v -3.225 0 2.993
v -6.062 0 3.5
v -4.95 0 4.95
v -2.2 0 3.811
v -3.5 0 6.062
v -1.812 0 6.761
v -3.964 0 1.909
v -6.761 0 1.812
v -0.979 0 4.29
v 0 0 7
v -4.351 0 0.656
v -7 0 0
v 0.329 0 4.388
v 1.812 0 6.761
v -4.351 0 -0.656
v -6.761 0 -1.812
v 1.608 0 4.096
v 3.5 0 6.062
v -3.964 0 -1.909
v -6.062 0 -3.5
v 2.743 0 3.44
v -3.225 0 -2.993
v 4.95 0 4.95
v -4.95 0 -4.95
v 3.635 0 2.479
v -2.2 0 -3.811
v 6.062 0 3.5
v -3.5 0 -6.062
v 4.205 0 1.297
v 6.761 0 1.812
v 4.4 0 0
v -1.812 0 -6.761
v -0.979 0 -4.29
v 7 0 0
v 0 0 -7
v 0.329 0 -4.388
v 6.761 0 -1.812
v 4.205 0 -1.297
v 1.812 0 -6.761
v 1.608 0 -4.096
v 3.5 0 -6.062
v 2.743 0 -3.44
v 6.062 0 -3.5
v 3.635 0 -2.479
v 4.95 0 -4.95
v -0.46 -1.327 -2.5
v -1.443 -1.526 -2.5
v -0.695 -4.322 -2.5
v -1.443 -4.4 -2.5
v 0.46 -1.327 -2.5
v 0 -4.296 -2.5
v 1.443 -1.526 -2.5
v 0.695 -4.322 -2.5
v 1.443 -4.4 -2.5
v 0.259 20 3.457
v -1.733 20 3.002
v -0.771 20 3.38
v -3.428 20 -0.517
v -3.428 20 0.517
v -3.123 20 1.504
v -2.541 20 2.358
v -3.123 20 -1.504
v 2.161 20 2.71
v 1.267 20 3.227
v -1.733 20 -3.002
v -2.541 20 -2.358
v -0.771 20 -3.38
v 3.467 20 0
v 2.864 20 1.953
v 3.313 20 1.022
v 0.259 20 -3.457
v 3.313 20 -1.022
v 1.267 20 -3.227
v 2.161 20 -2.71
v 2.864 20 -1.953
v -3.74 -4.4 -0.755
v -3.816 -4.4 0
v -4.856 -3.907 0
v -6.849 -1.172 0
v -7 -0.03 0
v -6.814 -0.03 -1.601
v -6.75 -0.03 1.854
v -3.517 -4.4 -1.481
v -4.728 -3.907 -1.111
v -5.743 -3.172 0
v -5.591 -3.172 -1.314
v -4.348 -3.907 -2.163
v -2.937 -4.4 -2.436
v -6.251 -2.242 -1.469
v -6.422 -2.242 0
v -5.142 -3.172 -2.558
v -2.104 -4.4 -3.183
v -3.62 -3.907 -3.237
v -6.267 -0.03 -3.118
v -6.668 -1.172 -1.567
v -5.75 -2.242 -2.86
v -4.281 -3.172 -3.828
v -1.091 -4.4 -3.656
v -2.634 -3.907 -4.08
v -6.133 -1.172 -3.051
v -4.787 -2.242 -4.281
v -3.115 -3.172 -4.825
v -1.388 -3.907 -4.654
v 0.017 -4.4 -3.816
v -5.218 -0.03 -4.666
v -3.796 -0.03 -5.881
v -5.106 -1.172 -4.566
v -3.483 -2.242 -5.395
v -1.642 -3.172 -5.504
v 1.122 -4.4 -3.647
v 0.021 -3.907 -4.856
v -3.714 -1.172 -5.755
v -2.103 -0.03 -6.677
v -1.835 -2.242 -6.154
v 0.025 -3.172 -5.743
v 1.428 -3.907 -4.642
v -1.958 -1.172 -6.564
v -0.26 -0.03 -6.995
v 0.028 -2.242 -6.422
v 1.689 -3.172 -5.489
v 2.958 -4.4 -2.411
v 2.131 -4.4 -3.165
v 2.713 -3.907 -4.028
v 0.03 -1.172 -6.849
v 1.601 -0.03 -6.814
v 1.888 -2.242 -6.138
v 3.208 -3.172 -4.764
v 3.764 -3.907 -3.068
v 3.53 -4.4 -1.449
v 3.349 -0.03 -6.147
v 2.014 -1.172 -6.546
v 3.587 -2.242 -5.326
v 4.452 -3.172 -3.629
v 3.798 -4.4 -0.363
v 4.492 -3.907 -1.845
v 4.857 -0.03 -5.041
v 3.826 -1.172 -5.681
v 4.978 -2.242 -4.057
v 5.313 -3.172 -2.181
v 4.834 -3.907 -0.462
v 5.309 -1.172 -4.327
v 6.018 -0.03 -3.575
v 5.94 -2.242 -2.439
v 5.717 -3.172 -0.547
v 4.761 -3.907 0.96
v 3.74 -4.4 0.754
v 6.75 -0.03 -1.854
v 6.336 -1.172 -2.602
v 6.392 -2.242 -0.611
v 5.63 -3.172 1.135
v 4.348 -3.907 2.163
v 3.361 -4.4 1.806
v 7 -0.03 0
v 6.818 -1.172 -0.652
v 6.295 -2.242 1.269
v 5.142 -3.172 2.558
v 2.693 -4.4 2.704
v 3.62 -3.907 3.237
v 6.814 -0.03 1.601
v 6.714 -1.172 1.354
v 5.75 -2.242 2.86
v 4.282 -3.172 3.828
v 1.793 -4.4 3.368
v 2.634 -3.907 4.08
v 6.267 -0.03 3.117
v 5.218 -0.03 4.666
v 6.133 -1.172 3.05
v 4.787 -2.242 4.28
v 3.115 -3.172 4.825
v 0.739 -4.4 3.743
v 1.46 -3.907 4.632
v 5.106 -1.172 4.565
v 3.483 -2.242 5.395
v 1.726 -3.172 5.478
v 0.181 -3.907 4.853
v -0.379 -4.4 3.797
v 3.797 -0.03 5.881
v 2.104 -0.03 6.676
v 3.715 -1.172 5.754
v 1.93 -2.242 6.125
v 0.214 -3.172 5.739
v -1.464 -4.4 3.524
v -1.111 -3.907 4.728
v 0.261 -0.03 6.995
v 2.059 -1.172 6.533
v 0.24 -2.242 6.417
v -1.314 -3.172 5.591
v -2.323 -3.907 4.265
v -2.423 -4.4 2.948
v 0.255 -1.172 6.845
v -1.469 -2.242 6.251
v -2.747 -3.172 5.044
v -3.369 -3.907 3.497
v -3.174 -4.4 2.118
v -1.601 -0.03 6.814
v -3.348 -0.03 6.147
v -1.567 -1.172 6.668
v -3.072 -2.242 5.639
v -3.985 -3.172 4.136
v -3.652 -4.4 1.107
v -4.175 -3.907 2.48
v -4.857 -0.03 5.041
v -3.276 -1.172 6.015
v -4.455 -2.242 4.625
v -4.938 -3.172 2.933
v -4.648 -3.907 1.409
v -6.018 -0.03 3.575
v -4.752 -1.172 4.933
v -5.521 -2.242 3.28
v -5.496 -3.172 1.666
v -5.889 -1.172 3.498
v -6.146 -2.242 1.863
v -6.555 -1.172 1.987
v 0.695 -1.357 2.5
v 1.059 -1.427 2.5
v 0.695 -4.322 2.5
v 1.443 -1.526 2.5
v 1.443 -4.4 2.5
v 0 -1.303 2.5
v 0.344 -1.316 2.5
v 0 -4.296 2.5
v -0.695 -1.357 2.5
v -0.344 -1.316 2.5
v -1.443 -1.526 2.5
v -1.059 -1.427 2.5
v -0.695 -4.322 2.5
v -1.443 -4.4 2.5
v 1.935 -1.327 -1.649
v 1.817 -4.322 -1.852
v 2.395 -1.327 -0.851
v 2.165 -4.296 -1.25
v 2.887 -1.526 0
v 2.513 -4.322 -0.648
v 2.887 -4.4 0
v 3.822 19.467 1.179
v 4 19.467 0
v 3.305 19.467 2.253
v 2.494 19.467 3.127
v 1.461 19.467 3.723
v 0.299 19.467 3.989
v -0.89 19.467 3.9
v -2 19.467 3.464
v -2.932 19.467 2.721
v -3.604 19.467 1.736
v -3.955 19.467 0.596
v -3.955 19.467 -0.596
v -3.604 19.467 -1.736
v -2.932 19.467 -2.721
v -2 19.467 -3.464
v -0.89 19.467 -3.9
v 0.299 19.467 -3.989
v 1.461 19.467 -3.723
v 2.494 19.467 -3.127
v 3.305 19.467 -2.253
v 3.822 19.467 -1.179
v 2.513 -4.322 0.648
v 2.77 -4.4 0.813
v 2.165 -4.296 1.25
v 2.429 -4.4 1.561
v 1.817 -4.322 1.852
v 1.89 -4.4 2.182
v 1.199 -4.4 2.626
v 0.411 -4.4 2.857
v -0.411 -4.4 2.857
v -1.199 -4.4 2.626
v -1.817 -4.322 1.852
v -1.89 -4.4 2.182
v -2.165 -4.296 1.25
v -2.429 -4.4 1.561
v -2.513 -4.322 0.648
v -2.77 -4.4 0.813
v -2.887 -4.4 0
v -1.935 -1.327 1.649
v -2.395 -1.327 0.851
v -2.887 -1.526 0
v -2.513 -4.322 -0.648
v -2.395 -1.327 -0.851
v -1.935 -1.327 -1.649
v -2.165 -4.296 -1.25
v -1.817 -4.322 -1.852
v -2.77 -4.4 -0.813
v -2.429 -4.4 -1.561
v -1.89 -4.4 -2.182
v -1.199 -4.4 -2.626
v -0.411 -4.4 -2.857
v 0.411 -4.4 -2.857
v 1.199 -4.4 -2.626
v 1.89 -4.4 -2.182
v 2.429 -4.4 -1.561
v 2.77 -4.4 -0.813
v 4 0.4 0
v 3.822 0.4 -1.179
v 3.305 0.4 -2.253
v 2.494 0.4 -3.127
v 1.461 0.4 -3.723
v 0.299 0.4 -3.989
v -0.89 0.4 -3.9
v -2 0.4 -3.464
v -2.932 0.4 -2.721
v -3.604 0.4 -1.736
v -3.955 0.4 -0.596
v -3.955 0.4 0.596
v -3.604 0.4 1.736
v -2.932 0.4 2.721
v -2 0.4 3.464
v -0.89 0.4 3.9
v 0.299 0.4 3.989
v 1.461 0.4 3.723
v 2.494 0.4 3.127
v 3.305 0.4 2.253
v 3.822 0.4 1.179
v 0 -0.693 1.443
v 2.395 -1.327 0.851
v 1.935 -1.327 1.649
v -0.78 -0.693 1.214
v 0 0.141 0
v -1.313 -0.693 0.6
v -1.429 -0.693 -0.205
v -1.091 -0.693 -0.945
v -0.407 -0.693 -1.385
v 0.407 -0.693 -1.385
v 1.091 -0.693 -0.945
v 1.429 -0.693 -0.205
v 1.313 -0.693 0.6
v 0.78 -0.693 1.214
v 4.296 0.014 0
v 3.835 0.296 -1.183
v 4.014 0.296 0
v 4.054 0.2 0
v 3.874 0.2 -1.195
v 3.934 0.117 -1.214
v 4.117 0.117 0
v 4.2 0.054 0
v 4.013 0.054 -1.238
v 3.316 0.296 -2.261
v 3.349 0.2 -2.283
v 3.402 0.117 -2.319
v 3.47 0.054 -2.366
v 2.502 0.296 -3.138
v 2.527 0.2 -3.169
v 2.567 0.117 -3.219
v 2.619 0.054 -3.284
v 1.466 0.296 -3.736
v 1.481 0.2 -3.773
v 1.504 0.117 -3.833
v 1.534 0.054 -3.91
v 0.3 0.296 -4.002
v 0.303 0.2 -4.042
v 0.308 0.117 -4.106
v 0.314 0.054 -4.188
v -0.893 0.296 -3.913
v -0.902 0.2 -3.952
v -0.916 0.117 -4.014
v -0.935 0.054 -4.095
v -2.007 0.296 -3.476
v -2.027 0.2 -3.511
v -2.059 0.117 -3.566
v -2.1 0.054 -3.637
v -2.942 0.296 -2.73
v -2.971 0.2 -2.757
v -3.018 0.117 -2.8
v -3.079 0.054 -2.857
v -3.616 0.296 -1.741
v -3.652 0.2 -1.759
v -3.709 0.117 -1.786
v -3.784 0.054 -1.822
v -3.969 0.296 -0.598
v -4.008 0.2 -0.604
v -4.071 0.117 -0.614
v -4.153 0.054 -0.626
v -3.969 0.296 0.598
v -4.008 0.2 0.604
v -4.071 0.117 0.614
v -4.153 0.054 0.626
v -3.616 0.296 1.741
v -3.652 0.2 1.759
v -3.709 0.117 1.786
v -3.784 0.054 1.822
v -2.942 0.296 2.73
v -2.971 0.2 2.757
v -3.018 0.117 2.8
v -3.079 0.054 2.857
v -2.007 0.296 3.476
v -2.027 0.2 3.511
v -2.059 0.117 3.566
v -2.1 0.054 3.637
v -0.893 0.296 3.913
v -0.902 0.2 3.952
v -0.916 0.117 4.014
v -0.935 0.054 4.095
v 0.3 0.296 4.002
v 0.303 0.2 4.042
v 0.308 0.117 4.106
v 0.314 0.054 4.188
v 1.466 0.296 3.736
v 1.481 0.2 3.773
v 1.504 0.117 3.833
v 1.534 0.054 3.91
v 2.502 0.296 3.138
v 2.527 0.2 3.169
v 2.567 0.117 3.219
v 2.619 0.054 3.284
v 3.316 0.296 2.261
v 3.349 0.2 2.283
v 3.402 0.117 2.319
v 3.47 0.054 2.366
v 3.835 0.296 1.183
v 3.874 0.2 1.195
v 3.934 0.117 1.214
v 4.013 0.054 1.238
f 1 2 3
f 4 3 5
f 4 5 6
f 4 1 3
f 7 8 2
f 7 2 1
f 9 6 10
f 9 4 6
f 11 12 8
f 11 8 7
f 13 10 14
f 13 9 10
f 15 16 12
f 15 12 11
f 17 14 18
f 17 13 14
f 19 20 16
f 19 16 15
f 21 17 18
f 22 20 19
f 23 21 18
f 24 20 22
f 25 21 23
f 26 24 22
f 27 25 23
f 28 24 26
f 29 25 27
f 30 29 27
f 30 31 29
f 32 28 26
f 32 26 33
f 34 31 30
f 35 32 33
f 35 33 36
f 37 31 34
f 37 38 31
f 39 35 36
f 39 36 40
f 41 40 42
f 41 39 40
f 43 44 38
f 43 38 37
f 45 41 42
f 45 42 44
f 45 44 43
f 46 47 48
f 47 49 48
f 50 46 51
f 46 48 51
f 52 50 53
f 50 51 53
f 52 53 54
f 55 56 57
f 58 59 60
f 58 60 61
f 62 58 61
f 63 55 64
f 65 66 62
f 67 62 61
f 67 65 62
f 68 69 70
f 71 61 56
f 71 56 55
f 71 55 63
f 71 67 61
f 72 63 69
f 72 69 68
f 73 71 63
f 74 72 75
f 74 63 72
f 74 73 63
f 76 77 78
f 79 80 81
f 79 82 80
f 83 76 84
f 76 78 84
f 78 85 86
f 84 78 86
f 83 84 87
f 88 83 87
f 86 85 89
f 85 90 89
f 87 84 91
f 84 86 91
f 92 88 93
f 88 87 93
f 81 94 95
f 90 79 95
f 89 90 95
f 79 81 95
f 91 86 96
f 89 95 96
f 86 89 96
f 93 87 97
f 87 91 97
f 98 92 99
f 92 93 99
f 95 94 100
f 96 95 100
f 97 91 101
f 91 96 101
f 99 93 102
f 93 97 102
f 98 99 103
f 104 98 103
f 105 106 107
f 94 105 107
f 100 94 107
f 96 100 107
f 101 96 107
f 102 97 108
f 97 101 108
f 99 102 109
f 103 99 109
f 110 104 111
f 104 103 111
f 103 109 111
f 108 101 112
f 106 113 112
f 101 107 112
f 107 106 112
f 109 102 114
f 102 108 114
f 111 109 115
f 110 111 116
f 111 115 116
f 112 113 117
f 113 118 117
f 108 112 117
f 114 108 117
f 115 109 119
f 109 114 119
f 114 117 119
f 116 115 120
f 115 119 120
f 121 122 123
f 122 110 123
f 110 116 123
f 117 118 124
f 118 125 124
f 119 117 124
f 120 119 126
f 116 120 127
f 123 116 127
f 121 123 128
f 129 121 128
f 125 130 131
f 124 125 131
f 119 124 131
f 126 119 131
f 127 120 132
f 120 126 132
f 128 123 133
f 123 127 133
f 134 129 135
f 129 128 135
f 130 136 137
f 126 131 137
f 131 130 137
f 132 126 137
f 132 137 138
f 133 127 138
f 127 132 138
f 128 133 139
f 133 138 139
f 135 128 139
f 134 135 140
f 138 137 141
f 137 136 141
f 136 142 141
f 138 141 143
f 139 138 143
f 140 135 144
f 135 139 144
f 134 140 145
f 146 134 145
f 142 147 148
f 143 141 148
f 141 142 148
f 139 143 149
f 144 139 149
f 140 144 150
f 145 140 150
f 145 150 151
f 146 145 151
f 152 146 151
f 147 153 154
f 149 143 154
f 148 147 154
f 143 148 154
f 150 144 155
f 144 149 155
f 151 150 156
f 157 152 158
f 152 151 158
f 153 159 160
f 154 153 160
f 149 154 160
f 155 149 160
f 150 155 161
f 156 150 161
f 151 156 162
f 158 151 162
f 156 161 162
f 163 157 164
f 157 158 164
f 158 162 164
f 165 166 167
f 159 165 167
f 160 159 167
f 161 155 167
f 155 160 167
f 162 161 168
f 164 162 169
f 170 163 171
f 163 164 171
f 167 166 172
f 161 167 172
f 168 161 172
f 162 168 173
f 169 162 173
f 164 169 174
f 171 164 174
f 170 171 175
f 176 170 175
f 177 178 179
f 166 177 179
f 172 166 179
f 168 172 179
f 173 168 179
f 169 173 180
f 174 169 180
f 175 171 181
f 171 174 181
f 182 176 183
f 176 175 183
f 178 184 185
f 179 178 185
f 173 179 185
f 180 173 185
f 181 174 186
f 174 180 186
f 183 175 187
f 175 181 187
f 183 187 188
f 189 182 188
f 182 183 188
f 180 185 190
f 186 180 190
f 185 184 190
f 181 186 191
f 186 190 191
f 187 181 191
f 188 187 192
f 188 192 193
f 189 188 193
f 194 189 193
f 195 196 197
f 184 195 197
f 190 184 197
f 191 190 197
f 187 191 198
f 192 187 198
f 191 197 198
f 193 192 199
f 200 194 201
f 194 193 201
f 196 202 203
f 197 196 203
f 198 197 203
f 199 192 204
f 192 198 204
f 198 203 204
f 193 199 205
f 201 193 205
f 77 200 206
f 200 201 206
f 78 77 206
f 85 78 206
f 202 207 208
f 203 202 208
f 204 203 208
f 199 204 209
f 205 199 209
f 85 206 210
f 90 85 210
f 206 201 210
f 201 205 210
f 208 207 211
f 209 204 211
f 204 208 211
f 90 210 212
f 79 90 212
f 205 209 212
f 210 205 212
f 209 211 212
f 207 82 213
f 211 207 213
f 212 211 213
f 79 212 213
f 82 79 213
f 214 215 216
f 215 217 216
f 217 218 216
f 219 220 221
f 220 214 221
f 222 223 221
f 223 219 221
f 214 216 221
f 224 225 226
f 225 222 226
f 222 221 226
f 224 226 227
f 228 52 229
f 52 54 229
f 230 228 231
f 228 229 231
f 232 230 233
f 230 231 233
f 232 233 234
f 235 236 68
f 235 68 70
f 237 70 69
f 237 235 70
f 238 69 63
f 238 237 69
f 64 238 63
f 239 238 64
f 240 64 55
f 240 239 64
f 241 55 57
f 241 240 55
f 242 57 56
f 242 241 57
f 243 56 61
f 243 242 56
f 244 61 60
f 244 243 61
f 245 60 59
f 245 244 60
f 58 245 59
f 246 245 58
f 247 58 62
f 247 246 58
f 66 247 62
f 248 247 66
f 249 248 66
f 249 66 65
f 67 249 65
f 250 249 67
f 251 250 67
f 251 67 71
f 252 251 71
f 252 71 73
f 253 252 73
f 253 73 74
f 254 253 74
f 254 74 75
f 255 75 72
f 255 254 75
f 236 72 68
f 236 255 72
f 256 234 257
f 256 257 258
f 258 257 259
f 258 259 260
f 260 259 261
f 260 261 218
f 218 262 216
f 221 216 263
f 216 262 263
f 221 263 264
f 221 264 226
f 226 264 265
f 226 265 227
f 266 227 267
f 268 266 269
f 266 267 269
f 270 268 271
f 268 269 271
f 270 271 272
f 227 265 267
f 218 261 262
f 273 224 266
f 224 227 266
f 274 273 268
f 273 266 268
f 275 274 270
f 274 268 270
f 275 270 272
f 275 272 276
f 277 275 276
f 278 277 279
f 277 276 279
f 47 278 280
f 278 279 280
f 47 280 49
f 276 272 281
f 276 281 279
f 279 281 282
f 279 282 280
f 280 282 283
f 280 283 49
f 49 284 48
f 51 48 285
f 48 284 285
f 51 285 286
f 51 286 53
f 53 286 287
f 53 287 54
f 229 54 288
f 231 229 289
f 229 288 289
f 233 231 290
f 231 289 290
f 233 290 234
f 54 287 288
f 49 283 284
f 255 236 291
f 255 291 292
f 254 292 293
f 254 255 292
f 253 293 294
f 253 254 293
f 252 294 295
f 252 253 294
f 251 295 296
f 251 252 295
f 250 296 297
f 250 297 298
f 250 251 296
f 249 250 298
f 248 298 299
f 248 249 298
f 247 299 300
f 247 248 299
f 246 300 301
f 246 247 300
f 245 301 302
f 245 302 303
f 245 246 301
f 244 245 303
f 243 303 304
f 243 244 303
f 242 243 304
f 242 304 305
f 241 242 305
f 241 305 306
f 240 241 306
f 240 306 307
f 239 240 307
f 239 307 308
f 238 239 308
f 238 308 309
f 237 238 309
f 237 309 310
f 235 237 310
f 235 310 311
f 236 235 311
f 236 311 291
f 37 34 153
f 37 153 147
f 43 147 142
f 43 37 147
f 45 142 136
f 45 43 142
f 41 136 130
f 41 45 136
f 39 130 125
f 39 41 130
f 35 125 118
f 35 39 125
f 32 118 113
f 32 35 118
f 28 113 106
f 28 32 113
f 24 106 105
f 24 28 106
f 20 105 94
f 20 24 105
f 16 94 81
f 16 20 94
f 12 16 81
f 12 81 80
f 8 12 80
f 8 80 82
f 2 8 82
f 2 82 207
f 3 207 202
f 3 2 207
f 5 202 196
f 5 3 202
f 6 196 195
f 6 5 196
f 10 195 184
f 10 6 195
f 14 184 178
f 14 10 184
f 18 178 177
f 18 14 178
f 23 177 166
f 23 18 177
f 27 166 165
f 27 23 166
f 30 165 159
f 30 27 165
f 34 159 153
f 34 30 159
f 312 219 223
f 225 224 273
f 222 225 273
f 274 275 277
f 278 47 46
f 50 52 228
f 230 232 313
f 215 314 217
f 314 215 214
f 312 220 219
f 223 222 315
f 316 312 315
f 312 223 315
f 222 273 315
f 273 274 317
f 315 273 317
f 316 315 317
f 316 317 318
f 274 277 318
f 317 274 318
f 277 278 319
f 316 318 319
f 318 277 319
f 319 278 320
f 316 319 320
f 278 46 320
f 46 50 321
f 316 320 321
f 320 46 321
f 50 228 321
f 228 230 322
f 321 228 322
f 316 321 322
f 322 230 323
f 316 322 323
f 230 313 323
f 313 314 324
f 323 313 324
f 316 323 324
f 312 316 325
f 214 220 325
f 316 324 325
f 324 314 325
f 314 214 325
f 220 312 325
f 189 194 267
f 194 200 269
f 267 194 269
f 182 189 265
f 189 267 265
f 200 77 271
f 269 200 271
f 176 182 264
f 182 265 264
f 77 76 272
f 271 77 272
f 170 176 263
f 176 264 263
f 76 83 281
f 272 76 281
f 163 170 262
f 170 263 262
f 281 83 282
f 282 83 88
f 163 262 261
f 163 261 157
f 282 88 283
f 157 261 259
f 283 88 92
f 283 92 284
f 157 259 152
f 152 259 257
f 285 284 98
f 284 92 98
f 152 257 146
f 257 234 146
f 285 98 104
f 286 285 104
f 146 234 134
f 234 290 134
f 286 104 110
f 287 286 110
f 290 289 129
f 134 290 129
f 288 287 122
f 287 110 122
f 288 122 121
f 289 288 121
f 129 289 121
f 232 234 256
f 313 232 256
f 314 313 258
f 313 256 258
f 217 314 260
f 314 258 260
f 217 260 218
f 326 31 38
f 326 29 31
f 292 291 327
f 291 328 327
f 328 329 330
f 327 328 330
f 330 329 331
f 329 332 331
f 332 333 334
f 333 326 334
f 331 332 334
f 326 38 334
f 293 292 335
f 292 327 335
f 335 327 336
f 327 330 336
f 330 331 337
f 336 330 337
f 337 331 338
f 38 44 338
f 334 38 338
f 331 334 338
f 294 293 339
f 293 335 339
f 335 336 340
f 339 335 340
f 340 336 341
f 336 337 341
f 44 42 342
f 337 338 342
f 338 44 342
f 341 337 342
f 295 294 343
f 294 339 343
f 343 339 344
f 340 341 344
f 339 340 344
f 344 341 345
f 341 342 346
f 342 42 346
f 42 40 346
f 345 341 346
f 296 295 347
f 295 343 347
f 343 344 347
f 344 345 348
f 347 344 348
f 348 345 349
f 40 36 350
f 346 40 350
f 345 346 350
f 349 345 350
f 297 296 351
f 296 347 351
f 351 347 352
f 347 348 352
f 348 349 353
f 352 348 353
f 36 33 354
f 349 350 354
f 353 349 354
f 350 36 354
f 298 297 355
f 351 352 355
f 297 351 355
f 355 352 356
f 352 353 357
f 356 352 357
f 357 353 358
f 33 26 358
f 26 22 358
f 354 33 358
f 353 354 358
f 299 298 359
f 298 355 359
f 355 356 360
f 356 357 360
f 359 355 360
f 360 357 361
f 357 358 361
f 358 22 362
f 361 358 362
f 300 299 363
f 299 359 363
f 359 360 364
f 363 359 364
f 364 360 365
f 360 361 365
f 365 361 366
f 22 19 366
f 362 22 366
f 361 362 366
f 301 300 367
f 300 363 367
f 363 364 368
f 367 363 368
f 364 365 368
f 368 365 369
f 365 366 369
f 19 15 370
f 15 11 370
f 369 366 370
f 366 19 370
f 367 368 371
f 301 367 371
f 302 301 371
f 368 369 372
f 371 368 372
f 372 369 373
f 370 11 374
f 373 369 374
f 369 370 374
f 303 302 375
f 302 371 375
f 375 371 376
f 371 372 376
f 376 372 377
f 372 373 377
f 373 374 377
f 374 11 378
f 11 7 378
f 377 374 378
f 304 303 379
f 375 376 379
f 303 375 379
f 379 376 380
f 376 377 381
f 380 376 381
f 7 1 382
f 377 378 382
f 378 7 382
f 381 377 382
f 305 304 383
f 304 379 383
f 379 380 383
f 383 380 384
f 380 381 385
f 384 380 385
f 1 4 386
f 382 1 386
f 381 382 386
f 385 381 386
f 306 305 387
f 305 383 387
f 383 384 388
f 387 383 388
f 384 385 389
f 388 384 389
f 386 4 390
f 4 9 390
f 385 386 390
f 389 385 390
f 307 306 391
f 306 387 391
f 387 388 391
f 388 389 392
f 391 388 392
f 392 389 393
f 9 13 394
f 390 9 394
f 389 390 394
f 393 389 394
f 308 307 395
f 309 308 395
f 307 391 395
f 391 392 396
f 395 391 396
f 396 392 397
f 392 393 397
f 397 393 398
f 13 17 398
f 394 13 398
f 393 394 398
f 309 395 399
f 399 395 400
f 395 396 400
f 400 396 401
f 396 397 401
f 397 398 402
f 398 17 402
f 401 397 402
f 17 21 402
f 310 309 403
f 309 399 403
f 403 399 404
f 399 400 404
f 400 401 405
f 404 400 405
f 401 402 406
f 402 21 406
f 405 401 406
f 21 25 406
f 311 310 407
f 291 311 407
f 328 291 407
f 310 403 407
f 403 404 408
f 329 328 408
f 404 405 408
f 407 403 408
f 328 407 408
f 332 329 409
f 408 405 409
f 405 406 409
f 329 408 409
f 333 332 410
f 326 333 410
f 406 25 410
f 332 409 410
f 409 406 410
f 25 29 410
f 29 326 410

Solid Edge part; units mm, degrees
sketch "Sketch1" plane through (0, 0, 0) normal (0, 0, 1) x (1, 0, 0)
  line L0 (4, 0) -> (4, 20)
  line L1 (0, 20) -> (4, 20)
  line L2 (0, 0) -> (0, 20)
  line L3 (0, 0) -> (0, -4.4)
  line L4 (0, -4.4) -> (7, -4.4)
  line L5 (7, -4.4) -> (7, 0)
  line L6 (7, 0) -> (4, 0)
revolve "RevolvedProtrusion1" add sketch "Sketch1" angle 360 about axis through (0, 0, 0) along (0, 1, 0)
sketch "Sketch2" plane through (0, 0, 0) normal (1, 0, 0) x (0, 1, 0)
  line L0 (-4.4, 3.3615) -> (-1.8, 3.3615)
  line L1 (0.1408, 0) -> (-1.8, 3.3615)
  line L2 (-4.4, 0) -> (0.1408, 0)
  line L3 (-4.4, 0) -> (-4.4, 3.3615)
revolve "RevolvedCutout1" cut sketch "Sketch2" angle 360 about axis through (0, -4.5, 0) along (0, 1, 0)
sketch "Sketch3" plane through (0, -4.4, 0) normal (0, -1, 0) x (0, 0, 1)
  circle A0 centre (0, 0) radius 3.3615
  line L0 (-2.5, -1.4434) -> (0, -2.8868)
  line L1 (0, -2.8868) -> (2.5, -1.4434)
  line L2 (2.5, -1.4434) -> (2.5, 1.4434)
  line L3 (2.5, 1.4434) -> (0, 2.8868)
  line L4 (0, 2.8868) -> (-2.5, 1.4434)
  line L5 (-2.5, 1.4434) -> (-2.5, -1.4434)
  dimension "D1" = 5
extrude "Protrusion1" add sketch "Sketch3" against normal up to next
sketch "Sketch4" plane through (0, 0, 0) normal (0, 0, 1) x (1, 0, 0)
  line L0 (-2.8868, -4.4) -> (0, -4.4)
  line L1 (0, -4.4) -> (0, -3.6265)
  line L2 (0, -3.6265) -> (-2.8868, -4.4)
revolve "RevolvedCutout2" cut sketch "Sketch4" angle 360 about axis through (0, -4.5, 0) along (0, 1, 0)
fillet "Round1" radius 0.4 1 edges at (0, 0, -4)
chamfer "倒斜角_2" distance 0.5333 angle 45 1 edges at (0, 20, -4)
cosmetic_thread "螺纹_3" size "M8" thread depth 17.5
sketch "Sketch5" plane through (0, 0, 0) normal (0, 0, 1) x (1, 0, 0)
  arc A0 (-3.8153, -4.4) -> (-7, 0) centre (-2.3681, 0) cw
revolve "RevolvedCutout3" cut sketch "Sketch5" angle 360 about axis through (0, 0, 0) along (0, -1, 0) material side at (-6.1609, -2.7452, 0)
